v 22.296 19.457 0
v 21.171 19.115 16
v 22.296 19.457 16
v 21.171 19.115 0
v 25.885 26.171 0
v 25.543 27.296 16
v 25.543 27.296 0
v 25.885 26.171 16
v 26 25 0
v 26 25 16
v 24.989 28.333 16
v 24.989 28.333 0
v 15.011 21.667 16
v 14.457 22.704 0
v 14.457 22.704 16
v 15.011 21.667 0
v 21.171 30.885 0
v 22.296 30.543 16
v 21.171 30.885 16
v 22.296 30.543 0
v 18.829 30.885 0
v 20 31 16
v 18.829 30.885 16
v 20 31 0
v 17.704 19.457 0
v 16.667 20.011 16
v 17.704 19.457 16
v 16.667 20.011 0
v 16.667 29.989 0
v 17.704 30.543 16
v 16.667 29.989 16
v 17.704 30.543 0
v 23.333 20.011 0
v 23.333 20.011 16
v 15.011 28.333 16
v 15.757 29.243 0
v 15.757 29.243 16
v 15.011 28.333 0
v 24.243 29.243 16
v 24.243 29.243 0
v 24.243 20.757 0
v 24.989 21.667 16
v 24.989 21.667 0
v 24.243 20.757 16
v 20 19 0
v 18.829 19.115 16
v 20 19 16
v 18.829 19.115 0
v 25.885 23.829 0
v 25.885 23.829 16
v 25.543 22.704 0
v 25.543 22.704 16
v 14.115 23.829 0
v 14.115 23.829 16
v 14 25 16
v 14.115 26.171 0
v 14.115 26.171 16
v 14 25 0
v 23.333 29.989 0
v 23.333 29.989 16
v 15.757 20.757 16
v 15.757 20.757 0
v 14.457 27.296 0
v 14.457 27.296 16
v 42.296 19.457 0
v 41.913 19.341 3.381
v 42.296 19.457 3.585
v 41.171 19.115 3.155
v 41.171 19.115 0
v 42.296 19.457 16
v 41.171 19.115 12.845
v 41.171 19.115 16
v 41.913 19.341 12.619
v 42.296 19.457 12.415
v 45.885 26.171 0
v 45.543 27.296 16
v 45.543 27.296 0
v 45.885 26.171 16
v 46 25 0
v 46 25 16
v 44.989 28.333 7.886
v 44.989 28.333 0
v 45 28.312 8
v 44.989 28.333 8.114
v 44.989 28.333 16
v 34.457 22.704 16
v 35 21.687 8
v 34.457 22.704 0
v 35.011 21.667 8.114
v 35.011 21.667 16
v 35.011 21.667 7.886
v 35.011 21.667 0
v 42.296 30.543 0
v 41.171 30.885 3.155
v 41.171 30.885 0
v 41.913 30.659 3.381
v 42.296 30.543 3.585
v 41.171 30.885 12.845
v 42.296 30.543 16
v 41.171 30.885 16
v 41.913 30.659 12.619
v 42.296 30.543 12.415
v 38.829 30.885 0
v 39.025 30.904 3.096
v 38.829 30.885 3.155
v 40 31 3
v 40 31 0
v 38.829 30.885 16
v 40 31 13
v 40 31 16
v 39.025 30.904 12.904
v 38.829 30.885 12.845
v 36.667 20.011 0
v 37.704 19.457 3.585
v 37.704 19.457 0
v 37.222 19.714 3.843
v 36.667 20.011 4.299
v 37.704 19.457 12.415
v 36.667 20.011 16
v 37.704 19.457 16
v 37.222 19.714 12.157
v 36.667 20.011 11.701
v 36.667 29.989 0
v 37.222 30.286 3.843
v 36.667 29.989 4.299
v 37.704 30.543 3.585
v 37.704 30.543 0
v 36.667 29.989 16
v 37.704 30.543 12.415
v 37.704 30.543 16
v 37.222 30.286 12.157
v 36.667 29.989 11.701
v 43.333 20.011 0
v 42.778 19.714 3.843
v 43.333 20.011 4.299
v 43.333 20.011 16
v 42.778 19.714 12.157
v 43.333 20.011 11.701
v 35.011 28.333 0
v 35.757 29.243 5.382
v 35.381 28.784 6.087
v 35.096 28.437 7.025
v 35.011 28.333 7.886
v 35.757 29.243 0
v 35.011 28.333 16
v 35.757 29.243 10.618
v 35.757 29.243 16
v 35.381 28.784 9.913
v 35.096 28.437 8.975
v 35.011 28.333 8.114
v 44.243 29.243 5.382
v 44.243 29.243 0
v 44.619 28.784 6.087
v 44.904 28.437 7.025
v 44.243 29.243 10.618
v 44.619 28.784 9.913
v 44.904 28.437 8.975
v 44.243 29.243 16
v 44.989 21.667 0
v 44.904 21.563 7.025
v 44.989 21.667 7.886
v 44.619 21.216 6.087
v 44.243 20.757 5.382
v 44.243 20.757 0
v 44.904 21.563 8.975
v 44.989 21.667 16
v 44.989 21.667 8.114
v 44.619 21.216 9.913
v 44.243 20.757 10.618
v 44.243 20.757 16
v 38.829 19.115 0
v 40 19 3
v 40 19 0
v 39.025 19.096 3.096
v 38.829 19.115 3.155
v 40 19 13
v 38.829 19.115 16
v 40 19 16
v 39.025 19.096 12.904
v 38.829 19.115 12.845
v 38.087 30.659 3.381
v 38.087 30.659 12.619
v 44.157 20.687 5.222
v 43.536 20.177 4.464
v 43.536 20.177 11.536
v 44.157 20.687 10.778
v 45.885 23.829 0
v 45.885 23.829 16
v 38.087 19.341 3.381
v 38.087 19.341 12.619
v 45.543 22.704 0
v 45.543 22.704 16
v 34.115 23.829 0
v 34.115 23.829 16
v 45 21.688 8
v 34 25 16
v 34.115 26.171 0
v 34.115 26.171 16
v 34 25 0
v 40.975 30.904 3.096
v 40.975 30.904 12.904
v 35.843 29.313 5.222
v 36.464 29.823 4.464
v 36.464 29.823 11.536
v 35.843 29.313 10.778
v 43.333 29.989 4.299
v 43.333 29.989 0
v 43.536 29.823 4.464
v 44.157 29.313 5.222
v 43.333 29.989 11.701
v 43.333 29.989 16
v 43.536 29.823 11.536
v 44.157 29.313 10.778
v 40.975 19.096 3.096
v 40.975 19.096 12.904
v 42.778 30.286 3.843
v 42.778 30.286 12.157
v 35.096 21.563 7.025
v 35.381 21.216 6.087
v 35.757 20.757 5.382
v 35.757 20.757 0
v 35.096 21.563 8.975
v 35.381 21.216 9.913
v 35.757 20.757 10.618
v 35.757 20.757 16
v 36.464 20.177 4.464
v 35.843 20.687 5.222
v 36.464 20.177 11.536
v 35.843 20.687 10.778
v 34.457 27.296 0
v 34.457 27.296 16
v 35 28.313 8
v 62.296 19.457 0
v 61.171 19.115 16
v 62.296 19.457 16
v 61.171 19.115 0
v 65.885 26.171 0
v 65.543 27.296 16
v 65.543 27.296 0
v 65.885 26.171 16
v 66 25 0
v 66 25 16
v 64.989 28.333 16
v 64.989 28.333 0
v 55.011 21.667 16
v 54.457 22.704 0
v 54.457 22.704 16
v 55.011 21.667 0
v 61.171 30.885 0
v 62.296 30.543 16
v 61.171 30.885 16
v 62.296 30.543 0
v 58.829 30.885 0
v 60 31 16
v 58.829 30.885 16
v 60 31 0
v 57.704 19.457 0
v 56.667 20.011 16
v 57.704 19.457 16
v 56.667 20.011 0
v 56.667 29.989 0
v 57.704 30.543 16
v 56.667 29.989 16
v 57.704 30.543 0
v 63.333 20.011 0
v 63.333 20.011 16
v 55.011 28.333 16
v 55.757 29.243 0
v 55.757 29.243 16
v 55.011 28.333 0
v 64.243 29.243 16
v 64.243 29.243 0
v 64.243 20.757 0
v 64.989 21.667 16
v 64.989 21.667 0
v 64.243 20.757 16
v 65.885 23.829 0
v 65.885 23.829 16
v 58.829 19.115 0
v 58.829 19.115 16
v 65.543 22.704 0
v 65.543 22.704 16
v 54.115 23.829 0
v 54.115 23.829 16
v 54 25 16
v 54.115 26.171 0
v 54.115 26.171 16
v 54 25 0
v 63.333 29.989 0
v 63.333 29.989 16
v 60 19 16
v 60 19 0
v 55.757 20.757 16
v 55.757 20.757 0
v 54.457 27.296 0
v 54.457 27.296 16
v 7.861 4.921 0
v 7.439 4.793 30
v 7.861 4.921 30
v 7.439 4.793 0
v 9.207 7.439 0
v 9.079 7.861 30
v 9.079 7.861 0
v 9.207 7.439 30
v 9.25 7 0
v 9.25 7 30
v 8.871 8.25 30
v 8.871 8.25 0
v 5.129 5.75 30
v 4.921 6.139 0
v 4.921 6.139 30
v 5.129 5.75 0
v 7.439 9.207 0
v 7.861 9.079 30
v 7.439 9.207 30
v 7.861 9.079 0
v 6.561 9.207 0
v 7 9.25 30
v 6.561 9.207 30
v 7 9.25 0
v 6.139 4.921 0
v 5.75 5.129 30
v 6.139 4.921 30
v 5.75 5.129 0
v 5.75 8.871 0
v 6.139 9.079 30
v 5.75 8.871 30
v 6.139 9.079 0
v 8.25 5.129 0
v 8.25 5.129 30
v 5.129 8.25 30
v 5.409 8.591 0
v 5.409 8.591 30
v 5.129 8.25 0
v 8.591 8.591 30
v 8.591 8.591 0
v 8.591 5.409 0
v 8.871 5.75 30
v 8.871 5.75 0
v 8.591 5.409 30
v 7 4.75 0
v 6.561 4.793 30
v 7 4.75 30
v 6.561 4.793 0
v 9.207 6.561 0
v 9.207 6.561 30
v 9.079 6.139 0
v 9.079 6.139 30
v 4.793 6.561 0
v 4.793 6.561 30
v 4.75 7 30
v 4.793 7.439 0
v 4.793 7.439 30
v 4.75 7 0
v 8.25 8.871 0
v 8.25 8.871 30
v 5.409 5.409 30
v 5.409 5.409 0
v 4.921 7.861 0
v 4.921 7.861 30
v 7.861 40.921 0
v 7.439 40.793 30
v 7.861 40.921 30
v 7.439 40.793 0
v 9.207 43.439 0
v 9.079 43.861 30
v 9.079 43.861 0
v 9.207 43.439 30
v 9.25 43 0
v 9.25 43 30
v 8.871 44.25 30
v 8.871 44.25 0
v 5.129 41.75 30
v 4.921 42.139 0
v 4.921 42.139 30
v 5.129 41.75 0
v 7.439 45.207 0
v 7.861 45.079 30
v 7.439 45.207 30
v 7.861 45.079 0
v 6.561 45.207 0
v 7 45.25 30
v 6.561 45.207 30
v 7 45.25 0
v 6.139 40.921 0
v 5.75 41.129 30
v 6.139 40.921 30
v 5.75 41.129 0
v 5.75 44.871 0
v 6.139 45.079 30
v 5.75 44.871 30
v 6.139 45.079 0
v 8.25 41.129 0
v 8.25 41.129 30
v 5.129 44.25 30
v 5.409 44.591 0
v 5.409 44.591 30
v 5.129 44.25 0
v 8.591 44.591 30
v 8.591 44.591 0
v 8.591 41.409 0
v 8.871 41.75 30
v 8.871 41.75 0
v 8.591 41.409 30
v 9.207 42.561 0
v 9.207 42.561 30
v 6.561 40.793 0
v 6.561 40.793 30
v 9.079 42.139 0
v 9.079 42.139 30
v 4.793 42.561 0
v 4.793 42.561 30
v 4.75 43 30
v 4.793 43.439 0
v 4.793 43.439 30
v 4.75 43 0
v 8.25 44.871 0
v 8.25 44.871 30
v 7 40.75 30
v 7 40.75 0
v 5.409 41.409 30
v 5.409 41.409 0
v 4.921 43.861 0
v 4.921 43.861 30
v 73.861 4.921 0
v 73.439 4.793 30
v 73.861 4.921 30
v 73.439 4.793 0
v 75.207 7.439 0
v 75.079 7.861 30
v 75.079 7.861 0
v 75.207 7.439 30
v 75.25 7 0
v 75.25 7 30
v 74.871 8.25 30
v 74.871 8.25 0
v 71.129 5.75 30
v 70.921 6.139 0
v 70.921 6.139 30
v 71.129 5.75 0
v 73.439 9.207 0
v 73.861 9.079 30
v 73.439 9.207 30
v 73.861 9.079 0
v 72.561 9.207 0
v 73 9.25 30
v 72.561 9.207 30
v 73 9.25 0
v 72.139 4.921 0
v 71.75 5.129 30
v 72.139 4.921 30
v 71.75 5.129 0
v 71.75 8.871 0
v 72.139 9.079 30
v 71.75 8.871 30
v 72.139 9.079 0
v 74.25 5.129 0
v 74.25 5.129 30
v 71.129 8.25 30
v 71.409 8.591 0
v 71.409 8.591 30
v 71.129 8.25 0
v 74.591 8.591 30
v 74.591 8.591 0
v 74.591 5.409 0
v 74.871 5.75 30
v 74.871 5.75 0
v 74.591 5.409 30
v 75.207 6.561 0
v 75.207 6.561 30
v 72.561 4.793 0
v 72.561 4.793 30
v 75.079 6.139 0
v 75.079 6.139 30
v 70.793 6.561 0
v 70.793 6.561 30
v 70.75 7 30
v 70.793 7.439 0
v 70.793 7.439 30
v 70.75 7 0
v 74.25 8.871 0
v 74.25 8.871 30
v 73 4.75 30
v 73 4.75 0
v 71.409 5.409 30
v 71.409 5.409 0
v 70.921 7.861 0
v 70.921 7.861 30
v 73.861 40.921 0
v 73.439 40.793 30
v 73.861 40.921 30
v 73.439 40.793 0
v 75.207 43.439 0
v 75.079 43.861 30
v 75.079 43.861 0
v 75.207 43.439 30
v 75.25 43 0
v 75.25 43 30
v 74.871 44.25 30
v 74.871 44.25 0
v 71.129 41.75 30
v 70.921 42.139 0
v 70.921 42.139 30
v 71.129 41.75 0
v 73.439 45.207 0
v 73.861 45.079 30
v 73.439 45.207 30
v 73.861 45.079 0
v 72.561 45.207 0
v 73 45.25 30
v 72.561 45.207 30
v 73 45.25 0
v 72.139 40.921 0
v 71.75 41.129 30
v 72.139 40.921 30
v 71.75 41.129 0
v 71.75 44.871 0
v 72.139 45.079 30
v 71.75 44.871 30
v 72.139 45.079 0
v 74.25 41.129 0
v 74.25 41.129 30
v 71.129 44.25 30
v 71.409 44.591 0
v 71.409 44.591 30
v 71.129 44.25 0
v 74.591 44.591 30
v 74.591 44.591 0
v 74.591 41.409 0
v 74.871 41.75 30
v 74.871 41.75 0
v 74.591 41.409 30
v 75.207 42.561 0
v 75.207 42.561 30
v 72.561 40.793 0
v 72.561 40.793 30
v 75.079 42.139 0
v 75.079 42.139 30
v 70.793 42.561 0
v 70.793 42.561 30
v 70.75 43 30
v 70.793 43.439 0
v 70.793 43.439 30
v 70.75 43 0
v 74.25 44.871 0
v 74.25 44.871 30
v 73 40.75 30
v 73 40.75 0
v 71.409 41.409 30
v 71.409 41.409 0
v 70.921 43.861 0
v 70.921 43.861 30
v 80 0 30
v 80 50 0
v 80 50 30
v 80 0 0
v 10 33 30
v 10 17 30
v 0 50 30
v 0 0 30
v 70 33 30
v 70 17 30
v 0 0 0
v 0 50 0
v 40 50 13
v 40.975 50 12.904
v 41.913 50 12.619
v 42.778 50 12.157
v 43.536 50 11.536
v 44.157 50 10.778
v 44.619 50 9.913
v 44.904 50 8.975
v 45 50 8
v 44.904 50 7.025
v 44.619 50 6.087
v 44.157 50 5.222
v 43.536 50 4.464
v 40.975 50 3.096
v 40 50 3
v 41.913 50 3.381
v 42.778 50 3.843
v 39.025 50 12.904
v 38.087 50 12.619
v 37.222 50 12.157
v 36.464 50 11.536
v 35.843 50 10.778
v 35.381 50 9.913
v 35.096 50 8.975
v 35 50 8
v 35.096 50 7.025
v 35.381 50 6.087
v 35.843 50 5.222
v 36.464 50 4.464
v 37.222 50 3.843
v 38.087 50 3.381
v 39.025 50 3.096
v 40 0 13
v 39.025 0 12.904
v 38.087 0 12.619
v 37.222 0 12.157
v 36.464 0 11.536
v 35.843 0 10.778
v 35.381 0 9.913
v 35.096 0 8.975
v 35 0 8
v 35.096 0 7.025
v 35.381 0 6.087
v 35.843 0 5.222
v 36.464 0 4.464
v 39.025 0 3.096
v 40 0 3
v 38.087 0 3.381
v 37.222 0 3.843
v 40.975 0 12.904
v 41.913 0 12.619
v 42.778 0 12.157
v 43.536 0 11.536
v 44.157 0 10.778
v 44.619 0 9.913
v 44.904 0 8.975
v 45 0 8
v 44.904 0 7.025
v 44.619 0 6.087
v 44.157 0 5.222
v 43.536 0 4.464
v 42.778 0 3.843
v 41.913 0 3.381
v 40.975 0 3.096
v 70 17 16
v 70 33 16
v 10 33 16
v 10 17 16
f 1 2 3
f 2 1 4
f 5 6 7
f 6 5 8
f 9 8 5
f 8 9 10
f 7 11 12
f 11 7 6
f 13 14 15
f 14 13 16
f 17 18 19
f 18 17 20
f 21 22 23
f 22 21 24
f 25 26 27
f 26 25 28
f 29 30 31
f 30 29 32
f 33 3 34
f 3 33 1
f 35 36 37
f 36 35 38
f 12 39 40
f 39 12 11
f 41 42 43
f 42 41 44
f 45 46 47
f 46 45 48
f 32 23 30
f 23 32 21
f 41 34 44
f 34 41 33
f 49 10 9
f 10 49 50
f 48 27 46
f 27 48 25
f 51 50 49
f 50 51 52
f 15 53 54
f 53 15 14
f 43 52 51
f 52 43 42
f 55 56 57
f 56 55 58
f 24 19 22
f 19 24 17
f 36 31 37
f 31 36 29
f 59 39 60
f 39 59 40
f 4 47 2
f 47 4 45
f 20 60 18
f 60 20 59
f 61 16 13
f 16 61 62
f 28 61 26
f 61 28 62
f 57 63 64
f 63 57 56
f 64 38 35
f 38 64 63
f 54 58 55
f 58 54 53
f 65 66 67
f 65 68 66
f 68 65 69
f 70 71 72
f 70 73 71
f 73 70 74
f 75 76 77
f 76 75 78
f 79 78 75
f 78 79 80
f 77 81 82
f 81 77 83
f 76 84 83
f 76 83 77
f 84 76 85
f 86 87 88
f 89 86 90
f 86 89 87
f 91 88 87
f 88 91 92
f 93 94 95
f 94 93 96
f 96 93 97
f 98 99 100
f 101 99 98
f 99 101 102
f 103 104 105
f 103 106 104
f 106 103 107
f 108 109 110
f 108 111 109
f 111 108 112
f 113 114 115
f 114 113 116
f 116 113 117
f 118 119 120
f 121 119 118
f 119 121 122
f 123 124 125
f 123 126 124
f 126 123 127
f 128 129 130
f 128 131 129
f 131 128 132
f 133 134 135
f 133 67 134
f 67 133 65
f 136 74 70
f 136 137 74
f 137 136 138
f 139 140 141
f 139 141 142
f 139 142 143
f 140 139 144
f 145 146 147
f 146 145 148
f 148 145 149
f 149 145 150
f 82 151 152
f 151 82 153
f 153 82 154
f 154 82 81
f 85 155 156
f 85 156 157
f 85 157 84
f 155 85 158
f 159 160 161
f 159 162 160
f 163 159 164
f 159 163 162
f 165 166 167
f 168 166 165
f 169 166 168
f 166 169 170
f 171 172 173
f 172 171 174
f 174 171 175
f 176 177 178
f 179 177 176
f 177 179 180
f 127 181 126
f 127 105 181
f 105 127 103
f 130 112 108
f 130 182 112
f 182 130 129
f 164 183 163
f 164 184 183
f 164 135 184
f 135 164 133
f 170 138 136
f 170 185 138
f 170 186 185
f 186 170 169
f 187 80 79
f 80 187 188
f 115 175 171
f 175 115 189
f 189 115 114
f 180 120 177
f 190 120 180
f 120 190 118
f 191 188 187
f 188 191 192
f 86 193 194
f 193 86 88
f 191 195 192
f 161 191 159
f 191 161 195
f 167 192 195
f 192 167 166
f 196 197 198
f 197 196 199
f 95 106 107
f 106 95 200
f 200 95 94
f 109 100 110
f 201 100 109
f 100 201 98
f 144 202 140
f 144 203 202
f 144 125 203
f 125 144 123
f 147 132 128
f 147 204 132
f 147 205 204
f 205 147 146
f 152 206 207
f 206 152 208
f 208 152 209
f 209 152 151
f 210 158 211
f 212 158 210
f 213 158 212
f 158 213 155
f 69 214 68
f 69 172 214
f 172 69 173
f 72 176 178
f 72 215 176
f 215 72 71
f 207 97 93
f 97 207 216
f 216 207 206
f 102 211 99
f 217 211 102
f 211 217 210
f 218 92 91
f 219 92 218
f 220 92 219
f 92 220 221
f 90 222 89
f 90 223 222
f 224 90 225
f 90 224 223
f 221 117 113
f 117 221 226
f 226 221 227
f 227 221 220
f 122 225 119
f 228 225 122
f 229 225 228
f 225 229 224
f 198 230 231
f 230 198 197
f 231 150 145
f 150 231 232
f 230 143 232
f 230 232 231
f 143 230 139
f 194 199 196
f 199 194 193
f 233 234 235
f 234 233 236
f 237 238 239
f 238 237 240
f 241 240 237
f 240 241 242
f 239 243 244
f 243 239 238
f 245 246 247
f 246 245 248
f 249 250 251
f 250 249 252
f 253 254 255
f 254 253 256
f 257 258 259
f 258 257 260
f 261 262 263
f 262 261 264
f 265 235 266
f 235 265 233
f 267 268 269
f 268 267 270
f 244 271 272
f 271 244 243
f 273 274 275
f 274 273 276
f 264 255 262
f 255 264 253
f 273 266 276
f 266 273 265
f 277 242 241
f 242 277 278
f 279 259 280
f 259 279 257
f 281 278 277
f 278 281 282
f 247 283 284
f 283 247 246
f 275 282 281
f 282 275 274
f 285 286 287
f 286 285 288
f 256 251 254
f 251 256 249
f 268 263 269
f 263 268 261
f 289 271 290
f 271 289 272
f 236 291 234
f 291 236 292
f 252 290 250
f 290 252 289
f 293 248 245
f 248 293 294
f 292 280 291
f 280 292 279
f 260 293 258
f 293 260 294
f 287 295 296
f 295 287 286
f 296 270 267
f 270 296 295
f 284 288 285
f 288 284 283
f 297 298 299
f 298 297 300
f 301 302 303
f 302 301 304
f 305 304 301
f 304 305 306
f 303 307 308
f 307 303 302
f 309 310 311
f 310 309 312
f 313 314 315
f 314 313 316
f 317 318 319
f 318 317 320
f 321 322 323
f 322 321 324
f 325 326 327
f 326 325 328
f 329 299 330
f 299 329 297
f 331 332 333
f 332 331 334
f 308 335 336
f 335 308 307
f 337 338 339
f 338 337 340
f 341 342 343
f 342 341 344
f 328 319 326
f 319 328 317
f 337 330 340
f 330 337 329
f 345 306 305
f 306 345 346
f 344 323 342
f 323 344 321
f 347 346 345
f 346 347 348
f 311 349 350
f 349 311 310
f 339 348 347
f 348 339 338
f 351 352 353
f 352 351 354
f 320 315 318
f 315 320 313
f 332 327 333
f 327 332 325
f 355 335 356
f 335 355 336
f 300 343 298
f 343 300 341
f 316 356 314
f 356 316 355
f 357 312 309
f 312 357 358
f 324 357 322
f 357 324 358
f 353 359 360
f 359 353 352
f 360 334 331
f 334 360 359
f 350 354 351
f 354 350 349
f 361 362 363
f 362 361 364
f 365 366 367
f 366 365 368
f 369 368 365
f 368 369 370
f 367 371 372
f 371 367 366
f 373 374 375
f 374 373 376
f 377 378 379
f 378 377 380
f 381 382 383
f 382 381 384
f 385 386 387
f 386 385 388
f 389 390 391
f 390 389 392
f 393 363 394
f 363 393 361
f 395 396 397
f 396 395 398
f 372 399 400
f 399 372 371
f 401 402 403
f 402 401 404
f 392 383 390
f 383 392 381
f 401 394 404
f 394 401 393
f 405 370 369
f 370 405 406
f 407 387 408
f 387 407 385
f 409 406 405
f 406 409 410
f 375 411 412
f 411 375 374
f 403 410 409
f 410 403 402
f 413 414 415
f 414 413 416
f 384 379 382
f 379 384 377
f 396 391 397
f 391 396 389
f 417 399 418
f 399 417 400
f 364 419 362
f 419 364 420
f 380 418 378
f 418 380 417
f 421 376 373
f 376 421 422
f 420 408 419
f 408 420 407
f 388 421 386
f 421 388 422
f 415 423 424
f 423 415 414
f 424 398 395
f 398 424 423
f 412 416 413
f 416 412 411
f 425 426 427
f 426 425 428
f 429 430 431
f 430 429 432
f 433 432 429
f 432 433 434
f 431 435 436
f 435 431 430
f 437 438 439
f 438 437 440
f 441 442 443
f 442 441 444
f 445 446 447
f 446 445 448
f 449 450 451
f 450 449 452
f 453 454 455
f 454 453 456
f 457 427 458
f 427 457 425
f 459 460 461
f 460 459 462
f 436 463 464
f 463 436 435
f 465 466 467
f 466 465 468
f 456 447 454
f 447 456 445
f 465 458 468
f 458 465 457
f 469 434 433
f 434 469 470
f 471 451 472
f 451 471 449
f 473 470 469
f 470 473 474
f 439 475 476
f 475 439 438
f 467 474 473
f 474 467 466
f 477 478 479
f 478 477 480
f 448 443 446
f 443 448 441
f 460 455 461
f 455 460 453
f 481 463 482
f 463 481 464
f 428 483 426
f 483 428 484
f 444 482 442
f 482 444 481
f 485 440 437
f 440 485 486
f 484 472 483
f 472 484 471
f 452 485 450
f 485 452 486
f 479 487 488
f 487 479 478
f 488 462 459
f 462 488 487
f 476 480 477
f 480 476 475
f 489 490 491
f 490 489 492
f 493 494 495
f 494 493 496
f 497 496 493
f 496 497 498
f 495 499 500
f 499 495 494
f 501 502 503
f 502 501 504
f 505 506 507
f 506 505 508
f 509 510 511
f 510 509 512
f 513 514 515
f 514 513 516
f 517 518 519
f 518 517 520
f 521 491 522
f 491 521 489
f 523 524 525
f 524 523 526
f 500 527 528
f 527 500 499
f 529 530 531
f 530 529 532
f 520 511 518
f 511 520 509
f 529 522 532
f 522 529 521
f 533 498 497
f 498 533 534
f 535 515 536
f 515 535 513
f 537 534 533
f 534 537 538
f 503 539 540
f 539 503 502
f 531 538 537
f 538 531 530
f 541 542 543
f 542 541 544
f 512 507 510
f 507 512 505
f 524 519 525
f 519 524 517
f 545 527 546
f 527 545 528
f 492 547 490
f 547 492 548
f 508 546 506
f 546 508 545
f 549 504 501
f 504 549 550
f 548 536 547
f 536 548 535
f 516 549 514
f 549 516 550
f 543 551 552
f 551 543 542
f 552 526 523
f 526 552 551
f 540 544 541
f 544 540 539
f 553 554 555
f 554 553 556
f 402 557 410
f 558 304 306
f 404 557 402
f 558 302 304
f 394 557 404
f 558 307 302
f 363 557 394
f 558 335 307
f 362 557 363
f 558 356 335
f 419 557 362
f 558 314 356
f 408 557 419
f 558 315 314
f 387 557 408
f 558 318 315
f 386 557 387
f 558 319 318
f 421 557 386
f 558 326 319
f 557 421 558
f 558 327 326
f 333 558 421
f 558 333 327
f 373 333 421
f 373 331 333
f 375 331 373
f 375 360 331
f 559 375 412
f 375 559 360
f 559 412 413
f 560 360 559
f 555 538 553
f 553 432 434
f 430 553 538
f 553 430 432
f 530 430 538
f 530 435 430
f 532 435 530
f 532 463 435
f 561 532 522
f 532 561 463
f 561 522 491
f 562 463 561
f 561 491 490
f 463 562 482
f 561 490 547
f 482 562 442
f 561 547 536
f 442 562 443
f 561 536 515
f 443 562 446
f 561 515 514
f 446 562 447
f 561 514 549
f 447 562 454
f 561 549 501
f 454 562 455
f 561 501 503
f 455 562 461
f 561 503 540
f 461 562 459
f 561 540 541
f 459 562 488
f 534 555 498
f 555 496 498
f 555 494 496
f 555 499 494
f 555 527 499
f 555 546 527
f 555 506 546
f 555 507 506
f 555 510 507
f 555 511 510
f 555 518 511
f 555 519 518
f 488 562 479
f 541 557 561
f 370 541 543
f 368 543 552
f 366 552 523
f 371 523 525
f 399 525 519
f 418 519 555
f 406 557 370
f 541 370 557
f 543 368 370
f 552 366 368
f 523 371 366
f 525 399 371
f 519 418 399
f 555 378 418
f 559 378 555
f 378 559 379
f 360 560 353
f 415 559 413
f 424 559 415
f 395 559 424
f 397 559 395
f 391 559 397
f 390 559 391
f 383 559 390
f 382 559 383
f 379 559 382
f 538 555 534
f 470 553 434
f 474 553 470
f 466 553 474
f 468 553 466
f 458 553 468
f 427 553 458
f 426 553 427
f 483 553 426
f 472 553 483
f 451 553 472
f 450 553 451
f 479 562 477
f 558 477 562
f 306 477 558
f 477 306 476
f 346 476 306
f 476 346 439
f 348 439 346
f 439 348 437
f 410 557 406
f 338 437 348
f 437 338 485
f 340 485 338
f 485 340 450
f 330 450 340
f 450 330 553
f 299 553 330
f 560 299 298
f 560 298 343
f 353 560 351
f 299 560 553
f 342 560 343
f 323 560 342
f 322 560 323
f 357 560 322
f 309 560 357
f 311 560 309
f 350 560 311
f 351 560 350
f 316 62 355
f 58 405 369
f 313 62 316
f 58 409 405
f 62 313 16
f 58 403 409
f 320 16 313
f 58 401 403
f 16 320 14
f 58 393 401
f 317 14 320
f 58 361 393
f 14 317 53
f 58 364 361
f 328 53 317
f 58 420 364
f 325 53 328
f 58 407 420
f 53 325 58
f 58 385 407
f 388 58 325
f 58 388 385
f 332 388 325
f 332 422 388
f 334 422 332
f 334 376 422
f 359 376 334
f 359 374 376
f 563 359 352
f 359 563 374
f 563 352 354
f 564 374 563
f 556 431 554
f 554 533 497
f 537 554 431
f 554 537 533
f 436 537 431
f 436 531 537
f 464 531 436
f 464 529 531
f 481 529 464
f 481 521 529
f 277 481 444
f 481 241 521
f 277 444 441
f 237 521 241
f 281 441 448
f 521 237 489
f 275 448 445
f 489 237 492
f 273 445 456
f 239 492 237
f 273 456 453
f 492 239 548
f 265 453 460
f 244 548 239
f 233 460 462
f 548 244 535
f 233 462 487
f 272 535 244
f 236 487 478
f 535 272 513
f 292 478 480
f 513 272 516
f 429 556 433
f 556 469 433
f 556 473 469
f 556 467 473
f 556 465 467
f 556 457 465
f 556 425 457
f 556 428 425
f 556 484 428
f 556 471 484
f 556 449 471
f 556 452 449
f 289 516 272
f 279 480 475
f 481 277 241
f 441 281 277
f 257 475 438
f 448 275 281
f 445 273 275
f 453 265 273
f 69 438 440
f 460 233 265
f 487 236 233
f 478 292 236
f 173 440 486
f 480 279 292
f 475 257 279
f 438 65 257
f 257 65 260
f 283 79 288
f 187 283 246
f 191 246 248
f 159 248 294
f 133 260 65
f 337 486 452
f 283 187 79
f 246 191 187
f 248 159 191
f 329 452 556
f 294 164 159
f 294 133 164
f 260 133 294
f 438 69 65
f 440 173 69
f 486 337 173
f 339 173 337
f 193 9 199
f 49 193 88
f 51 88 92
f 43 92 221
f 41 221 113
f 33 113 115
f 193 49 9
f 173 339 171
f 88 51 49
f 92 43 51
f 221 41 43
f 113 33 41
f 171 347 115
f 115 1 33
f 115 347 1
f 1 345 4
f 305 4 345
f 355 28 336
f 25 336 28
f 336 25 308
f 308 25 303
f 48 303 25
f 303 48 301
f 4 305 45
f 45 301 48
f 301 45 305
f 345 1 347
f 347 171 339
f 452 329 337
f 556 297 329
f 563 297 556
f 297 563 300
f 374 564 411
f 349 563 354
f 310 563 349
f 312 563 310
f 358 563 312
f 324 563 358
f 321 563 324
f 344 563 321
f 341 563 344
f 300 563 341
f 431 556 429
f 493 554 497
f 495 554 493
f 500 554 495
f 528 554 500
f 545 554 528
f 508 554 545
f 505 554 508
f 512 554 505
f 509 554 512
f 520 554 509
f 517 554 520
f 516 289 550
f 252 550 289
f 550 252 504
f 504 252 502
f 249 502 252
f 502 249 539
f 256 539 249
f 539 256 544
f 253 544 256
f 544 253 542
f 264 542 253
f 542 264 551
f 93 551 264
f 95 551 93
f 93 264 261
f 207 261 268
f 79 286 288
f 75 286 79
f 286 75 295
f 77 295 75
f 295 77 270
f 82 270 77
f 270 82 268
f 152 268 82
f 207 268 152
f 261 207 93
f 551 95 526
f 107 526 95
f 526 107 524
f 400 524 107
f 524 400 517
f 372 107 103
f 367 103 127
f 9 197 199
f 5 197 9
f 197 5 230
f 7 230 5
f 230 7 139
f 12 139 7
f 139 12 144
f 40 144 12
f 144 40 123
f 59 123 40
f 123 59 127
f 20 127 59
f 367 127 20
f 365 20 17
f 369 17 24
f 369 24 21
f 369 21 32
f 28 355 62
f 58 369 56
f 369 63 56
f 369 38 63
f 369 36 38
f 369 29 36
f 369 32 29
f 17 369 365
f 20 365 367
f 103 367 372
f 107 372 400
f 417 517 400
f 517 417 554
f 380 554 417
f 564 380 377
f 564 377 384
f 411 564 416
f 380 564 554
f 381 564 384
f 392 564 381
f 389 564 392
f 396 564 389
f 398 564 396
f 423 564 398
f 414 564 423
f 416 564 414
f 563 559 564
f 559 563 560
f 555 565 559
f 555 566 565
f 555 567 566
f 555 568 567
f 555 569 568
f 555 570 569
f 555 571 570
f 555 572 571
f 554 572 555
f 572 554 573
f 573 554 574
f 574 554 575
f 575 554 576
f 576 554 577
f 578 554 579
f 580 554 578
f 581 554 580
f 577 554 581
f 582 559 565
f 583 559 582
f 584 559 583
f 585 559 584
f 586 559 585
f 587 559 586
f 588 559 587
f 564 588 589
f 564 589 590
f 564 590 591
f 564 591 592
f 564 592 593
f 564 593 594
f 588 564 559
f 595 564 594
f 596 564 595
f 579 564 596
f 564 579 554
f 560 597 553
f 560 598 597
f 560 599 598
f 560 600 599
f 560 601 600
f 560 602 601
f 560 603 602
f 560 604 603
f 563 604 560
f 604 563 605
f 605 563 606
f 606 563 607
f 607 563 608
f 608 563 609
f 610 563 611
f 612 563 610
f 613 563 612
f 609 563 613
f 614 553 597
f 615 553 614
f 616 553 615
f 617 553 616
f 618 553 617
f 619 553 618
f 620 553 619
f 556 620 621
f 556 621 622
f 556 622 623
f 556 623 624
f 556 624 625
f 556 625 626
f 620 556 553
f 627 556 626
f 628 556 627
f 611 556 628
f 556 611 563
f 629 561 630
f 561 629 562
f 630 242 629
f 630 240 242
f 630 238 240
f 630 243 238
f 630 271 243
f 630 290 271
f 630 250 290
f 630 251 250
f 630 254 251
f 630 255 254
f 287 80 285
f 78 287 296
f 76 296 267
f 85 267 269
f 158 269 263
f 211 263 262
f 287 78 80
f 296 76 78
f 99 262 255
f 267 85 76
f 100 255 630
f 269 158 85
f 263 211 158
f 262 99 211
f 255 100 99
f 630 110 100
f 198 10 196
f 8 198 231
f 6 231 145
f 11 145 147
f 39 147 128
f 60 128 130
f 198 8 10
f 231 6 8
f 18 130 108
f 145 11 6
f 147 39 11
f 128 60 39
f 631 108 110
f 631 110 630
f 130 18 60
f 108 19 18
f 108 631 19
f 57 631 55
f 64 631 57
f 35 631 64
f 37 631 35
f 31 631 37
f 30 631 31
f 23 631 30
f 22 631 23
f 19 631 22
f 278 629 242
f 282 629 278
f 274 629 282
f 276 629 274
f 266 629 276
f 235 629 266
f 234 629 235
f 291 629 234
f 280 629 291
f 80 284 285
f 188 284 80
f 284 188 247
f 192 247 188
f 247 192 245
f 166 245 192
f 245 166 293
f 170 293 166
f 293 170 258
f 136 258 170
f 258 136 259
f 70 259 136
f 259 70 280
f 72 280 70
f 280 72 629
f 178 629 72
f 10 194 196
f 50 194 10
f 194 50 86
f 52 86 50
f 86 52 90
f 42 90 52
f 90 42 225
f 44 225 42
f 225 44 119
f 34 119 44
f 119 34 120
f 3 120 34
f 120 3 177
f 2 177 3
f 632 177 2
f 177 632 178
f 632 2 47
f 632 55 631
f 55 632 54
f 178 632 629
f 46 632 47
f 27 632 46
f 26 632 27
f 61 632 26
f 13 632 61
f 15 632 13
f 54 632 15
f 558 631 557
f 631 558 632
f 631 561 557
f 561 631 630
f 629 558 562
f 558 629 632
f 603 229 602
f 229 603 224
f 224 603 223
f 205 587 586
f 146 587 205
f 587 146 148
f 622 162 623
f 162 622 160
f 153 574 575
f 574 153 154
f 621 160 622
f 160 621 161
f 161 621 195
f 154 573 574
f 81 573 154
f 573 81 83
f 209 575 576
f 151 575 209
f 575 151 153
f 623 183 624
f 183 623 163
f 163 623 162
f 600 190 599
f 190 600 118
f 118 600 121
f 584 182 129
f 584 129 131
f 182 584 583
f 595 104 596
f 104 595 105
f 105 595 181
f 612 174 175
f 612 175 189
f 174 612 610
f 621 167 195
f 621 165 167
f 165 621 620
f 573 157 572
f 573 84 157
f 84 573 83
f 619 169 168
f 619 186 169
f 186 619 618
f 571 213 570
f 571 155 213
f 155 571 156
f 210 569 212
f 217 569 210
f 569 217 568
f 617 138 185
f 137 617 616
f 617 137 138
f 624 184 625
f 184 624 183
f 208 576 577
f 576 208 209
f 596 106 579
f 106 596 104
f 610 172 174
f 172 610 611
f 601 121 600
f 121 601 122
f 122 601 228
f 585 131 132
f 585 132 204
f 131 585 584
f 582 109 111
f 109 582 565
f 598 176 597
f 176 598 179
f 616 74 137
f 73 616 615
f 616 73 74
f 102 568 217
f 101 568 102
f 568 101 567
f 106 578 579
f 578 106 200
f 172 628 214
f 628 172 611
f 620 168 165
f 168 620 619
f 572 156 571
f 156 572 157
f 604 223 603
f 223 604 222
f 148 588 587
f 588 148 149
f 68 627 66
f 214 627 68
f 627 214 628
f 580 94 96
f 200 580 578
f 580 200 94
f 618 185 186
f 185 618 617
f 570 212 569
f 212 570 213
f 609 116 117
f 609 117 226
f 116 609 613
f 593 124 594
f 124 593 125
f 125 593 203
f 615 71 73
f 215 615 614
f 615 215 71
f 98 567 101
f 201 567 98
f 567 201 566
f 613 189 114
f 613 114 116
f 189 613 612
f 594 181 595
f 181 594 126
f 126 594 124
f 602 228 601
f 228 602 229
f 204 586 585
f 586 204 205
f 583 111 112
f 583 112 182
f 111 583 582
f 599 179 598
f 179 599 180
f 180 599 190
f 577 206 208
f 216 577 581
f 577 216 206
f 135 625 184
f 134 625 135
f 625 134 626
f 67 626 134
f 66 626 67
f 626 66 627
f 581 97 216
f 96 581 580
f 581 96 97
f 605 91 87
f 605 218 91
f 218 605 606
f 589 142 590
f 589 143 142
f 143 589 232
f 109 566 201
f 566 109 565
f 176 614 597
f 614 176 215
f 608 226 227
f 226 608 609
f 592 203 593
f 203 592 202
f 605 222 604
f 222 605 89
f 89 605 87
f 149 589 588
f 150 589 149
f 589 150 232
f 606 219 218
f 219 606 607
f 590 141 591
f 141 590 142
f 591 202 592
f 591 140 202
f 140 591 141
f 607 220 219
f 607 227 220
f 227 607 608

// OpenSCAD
$fn = 32;

// ----------------------------------------------------------------------
// Manifold block: side_outlet manifold
// ----------------------------------------------------------------------

// --- parameters (mm) ---
block_l = 80;             // block length, X
block_w = 50;             // block width, Y
block_h = 30;             // block height, Z
port_d = 12;              // port bore diameter
port_pitch = 20;          // port pitch along X
gallery_d = 16;           // top gallery width, Y
gallery_depth = 14;       // gallery pocket depth
wall_p = 10;              // gallery end wall thickness, X
mnt_d = 4.5;              // mounting hole diameter
mnt_in = 7;               // mounting hole inset from the edges
out_d = 10;               // outlet bore diameter
out_z = 8;                // outlet axis height

n_ports = 3;  // ports in the row
port_x0 = (block_l - (n_ports - 1) * port_pitch) / 2;  // first port X

difference() {
  cube([block_l, block_w, block_h]);
  for (i = [0 : n_ports - 1])
    translate([port_x0 + i * port_pitch, block_w / 2, -1])
      cylinder(h = block_h + 2, d = port_d);
  translate([wall_p, block_w / 2 - gallery_d / 2, block_h - gallery_depth])
    cube([block_l - 2 * wall_p, gallery_d, gallery_depth + 1]);
  for (cx = [mnt_in, block_l - mnt_in])
    for (cy = [mnt_in, block_w - mnt_in])
      translate([cx, cy, -1]) cylinder(h = block_h + 2, d = mnt_d);
  translate([block_l / 2, -1, out_z]) rotate([-90, 0, 0])
    cylinder(h = block_w + 2, d = out_d);
}
